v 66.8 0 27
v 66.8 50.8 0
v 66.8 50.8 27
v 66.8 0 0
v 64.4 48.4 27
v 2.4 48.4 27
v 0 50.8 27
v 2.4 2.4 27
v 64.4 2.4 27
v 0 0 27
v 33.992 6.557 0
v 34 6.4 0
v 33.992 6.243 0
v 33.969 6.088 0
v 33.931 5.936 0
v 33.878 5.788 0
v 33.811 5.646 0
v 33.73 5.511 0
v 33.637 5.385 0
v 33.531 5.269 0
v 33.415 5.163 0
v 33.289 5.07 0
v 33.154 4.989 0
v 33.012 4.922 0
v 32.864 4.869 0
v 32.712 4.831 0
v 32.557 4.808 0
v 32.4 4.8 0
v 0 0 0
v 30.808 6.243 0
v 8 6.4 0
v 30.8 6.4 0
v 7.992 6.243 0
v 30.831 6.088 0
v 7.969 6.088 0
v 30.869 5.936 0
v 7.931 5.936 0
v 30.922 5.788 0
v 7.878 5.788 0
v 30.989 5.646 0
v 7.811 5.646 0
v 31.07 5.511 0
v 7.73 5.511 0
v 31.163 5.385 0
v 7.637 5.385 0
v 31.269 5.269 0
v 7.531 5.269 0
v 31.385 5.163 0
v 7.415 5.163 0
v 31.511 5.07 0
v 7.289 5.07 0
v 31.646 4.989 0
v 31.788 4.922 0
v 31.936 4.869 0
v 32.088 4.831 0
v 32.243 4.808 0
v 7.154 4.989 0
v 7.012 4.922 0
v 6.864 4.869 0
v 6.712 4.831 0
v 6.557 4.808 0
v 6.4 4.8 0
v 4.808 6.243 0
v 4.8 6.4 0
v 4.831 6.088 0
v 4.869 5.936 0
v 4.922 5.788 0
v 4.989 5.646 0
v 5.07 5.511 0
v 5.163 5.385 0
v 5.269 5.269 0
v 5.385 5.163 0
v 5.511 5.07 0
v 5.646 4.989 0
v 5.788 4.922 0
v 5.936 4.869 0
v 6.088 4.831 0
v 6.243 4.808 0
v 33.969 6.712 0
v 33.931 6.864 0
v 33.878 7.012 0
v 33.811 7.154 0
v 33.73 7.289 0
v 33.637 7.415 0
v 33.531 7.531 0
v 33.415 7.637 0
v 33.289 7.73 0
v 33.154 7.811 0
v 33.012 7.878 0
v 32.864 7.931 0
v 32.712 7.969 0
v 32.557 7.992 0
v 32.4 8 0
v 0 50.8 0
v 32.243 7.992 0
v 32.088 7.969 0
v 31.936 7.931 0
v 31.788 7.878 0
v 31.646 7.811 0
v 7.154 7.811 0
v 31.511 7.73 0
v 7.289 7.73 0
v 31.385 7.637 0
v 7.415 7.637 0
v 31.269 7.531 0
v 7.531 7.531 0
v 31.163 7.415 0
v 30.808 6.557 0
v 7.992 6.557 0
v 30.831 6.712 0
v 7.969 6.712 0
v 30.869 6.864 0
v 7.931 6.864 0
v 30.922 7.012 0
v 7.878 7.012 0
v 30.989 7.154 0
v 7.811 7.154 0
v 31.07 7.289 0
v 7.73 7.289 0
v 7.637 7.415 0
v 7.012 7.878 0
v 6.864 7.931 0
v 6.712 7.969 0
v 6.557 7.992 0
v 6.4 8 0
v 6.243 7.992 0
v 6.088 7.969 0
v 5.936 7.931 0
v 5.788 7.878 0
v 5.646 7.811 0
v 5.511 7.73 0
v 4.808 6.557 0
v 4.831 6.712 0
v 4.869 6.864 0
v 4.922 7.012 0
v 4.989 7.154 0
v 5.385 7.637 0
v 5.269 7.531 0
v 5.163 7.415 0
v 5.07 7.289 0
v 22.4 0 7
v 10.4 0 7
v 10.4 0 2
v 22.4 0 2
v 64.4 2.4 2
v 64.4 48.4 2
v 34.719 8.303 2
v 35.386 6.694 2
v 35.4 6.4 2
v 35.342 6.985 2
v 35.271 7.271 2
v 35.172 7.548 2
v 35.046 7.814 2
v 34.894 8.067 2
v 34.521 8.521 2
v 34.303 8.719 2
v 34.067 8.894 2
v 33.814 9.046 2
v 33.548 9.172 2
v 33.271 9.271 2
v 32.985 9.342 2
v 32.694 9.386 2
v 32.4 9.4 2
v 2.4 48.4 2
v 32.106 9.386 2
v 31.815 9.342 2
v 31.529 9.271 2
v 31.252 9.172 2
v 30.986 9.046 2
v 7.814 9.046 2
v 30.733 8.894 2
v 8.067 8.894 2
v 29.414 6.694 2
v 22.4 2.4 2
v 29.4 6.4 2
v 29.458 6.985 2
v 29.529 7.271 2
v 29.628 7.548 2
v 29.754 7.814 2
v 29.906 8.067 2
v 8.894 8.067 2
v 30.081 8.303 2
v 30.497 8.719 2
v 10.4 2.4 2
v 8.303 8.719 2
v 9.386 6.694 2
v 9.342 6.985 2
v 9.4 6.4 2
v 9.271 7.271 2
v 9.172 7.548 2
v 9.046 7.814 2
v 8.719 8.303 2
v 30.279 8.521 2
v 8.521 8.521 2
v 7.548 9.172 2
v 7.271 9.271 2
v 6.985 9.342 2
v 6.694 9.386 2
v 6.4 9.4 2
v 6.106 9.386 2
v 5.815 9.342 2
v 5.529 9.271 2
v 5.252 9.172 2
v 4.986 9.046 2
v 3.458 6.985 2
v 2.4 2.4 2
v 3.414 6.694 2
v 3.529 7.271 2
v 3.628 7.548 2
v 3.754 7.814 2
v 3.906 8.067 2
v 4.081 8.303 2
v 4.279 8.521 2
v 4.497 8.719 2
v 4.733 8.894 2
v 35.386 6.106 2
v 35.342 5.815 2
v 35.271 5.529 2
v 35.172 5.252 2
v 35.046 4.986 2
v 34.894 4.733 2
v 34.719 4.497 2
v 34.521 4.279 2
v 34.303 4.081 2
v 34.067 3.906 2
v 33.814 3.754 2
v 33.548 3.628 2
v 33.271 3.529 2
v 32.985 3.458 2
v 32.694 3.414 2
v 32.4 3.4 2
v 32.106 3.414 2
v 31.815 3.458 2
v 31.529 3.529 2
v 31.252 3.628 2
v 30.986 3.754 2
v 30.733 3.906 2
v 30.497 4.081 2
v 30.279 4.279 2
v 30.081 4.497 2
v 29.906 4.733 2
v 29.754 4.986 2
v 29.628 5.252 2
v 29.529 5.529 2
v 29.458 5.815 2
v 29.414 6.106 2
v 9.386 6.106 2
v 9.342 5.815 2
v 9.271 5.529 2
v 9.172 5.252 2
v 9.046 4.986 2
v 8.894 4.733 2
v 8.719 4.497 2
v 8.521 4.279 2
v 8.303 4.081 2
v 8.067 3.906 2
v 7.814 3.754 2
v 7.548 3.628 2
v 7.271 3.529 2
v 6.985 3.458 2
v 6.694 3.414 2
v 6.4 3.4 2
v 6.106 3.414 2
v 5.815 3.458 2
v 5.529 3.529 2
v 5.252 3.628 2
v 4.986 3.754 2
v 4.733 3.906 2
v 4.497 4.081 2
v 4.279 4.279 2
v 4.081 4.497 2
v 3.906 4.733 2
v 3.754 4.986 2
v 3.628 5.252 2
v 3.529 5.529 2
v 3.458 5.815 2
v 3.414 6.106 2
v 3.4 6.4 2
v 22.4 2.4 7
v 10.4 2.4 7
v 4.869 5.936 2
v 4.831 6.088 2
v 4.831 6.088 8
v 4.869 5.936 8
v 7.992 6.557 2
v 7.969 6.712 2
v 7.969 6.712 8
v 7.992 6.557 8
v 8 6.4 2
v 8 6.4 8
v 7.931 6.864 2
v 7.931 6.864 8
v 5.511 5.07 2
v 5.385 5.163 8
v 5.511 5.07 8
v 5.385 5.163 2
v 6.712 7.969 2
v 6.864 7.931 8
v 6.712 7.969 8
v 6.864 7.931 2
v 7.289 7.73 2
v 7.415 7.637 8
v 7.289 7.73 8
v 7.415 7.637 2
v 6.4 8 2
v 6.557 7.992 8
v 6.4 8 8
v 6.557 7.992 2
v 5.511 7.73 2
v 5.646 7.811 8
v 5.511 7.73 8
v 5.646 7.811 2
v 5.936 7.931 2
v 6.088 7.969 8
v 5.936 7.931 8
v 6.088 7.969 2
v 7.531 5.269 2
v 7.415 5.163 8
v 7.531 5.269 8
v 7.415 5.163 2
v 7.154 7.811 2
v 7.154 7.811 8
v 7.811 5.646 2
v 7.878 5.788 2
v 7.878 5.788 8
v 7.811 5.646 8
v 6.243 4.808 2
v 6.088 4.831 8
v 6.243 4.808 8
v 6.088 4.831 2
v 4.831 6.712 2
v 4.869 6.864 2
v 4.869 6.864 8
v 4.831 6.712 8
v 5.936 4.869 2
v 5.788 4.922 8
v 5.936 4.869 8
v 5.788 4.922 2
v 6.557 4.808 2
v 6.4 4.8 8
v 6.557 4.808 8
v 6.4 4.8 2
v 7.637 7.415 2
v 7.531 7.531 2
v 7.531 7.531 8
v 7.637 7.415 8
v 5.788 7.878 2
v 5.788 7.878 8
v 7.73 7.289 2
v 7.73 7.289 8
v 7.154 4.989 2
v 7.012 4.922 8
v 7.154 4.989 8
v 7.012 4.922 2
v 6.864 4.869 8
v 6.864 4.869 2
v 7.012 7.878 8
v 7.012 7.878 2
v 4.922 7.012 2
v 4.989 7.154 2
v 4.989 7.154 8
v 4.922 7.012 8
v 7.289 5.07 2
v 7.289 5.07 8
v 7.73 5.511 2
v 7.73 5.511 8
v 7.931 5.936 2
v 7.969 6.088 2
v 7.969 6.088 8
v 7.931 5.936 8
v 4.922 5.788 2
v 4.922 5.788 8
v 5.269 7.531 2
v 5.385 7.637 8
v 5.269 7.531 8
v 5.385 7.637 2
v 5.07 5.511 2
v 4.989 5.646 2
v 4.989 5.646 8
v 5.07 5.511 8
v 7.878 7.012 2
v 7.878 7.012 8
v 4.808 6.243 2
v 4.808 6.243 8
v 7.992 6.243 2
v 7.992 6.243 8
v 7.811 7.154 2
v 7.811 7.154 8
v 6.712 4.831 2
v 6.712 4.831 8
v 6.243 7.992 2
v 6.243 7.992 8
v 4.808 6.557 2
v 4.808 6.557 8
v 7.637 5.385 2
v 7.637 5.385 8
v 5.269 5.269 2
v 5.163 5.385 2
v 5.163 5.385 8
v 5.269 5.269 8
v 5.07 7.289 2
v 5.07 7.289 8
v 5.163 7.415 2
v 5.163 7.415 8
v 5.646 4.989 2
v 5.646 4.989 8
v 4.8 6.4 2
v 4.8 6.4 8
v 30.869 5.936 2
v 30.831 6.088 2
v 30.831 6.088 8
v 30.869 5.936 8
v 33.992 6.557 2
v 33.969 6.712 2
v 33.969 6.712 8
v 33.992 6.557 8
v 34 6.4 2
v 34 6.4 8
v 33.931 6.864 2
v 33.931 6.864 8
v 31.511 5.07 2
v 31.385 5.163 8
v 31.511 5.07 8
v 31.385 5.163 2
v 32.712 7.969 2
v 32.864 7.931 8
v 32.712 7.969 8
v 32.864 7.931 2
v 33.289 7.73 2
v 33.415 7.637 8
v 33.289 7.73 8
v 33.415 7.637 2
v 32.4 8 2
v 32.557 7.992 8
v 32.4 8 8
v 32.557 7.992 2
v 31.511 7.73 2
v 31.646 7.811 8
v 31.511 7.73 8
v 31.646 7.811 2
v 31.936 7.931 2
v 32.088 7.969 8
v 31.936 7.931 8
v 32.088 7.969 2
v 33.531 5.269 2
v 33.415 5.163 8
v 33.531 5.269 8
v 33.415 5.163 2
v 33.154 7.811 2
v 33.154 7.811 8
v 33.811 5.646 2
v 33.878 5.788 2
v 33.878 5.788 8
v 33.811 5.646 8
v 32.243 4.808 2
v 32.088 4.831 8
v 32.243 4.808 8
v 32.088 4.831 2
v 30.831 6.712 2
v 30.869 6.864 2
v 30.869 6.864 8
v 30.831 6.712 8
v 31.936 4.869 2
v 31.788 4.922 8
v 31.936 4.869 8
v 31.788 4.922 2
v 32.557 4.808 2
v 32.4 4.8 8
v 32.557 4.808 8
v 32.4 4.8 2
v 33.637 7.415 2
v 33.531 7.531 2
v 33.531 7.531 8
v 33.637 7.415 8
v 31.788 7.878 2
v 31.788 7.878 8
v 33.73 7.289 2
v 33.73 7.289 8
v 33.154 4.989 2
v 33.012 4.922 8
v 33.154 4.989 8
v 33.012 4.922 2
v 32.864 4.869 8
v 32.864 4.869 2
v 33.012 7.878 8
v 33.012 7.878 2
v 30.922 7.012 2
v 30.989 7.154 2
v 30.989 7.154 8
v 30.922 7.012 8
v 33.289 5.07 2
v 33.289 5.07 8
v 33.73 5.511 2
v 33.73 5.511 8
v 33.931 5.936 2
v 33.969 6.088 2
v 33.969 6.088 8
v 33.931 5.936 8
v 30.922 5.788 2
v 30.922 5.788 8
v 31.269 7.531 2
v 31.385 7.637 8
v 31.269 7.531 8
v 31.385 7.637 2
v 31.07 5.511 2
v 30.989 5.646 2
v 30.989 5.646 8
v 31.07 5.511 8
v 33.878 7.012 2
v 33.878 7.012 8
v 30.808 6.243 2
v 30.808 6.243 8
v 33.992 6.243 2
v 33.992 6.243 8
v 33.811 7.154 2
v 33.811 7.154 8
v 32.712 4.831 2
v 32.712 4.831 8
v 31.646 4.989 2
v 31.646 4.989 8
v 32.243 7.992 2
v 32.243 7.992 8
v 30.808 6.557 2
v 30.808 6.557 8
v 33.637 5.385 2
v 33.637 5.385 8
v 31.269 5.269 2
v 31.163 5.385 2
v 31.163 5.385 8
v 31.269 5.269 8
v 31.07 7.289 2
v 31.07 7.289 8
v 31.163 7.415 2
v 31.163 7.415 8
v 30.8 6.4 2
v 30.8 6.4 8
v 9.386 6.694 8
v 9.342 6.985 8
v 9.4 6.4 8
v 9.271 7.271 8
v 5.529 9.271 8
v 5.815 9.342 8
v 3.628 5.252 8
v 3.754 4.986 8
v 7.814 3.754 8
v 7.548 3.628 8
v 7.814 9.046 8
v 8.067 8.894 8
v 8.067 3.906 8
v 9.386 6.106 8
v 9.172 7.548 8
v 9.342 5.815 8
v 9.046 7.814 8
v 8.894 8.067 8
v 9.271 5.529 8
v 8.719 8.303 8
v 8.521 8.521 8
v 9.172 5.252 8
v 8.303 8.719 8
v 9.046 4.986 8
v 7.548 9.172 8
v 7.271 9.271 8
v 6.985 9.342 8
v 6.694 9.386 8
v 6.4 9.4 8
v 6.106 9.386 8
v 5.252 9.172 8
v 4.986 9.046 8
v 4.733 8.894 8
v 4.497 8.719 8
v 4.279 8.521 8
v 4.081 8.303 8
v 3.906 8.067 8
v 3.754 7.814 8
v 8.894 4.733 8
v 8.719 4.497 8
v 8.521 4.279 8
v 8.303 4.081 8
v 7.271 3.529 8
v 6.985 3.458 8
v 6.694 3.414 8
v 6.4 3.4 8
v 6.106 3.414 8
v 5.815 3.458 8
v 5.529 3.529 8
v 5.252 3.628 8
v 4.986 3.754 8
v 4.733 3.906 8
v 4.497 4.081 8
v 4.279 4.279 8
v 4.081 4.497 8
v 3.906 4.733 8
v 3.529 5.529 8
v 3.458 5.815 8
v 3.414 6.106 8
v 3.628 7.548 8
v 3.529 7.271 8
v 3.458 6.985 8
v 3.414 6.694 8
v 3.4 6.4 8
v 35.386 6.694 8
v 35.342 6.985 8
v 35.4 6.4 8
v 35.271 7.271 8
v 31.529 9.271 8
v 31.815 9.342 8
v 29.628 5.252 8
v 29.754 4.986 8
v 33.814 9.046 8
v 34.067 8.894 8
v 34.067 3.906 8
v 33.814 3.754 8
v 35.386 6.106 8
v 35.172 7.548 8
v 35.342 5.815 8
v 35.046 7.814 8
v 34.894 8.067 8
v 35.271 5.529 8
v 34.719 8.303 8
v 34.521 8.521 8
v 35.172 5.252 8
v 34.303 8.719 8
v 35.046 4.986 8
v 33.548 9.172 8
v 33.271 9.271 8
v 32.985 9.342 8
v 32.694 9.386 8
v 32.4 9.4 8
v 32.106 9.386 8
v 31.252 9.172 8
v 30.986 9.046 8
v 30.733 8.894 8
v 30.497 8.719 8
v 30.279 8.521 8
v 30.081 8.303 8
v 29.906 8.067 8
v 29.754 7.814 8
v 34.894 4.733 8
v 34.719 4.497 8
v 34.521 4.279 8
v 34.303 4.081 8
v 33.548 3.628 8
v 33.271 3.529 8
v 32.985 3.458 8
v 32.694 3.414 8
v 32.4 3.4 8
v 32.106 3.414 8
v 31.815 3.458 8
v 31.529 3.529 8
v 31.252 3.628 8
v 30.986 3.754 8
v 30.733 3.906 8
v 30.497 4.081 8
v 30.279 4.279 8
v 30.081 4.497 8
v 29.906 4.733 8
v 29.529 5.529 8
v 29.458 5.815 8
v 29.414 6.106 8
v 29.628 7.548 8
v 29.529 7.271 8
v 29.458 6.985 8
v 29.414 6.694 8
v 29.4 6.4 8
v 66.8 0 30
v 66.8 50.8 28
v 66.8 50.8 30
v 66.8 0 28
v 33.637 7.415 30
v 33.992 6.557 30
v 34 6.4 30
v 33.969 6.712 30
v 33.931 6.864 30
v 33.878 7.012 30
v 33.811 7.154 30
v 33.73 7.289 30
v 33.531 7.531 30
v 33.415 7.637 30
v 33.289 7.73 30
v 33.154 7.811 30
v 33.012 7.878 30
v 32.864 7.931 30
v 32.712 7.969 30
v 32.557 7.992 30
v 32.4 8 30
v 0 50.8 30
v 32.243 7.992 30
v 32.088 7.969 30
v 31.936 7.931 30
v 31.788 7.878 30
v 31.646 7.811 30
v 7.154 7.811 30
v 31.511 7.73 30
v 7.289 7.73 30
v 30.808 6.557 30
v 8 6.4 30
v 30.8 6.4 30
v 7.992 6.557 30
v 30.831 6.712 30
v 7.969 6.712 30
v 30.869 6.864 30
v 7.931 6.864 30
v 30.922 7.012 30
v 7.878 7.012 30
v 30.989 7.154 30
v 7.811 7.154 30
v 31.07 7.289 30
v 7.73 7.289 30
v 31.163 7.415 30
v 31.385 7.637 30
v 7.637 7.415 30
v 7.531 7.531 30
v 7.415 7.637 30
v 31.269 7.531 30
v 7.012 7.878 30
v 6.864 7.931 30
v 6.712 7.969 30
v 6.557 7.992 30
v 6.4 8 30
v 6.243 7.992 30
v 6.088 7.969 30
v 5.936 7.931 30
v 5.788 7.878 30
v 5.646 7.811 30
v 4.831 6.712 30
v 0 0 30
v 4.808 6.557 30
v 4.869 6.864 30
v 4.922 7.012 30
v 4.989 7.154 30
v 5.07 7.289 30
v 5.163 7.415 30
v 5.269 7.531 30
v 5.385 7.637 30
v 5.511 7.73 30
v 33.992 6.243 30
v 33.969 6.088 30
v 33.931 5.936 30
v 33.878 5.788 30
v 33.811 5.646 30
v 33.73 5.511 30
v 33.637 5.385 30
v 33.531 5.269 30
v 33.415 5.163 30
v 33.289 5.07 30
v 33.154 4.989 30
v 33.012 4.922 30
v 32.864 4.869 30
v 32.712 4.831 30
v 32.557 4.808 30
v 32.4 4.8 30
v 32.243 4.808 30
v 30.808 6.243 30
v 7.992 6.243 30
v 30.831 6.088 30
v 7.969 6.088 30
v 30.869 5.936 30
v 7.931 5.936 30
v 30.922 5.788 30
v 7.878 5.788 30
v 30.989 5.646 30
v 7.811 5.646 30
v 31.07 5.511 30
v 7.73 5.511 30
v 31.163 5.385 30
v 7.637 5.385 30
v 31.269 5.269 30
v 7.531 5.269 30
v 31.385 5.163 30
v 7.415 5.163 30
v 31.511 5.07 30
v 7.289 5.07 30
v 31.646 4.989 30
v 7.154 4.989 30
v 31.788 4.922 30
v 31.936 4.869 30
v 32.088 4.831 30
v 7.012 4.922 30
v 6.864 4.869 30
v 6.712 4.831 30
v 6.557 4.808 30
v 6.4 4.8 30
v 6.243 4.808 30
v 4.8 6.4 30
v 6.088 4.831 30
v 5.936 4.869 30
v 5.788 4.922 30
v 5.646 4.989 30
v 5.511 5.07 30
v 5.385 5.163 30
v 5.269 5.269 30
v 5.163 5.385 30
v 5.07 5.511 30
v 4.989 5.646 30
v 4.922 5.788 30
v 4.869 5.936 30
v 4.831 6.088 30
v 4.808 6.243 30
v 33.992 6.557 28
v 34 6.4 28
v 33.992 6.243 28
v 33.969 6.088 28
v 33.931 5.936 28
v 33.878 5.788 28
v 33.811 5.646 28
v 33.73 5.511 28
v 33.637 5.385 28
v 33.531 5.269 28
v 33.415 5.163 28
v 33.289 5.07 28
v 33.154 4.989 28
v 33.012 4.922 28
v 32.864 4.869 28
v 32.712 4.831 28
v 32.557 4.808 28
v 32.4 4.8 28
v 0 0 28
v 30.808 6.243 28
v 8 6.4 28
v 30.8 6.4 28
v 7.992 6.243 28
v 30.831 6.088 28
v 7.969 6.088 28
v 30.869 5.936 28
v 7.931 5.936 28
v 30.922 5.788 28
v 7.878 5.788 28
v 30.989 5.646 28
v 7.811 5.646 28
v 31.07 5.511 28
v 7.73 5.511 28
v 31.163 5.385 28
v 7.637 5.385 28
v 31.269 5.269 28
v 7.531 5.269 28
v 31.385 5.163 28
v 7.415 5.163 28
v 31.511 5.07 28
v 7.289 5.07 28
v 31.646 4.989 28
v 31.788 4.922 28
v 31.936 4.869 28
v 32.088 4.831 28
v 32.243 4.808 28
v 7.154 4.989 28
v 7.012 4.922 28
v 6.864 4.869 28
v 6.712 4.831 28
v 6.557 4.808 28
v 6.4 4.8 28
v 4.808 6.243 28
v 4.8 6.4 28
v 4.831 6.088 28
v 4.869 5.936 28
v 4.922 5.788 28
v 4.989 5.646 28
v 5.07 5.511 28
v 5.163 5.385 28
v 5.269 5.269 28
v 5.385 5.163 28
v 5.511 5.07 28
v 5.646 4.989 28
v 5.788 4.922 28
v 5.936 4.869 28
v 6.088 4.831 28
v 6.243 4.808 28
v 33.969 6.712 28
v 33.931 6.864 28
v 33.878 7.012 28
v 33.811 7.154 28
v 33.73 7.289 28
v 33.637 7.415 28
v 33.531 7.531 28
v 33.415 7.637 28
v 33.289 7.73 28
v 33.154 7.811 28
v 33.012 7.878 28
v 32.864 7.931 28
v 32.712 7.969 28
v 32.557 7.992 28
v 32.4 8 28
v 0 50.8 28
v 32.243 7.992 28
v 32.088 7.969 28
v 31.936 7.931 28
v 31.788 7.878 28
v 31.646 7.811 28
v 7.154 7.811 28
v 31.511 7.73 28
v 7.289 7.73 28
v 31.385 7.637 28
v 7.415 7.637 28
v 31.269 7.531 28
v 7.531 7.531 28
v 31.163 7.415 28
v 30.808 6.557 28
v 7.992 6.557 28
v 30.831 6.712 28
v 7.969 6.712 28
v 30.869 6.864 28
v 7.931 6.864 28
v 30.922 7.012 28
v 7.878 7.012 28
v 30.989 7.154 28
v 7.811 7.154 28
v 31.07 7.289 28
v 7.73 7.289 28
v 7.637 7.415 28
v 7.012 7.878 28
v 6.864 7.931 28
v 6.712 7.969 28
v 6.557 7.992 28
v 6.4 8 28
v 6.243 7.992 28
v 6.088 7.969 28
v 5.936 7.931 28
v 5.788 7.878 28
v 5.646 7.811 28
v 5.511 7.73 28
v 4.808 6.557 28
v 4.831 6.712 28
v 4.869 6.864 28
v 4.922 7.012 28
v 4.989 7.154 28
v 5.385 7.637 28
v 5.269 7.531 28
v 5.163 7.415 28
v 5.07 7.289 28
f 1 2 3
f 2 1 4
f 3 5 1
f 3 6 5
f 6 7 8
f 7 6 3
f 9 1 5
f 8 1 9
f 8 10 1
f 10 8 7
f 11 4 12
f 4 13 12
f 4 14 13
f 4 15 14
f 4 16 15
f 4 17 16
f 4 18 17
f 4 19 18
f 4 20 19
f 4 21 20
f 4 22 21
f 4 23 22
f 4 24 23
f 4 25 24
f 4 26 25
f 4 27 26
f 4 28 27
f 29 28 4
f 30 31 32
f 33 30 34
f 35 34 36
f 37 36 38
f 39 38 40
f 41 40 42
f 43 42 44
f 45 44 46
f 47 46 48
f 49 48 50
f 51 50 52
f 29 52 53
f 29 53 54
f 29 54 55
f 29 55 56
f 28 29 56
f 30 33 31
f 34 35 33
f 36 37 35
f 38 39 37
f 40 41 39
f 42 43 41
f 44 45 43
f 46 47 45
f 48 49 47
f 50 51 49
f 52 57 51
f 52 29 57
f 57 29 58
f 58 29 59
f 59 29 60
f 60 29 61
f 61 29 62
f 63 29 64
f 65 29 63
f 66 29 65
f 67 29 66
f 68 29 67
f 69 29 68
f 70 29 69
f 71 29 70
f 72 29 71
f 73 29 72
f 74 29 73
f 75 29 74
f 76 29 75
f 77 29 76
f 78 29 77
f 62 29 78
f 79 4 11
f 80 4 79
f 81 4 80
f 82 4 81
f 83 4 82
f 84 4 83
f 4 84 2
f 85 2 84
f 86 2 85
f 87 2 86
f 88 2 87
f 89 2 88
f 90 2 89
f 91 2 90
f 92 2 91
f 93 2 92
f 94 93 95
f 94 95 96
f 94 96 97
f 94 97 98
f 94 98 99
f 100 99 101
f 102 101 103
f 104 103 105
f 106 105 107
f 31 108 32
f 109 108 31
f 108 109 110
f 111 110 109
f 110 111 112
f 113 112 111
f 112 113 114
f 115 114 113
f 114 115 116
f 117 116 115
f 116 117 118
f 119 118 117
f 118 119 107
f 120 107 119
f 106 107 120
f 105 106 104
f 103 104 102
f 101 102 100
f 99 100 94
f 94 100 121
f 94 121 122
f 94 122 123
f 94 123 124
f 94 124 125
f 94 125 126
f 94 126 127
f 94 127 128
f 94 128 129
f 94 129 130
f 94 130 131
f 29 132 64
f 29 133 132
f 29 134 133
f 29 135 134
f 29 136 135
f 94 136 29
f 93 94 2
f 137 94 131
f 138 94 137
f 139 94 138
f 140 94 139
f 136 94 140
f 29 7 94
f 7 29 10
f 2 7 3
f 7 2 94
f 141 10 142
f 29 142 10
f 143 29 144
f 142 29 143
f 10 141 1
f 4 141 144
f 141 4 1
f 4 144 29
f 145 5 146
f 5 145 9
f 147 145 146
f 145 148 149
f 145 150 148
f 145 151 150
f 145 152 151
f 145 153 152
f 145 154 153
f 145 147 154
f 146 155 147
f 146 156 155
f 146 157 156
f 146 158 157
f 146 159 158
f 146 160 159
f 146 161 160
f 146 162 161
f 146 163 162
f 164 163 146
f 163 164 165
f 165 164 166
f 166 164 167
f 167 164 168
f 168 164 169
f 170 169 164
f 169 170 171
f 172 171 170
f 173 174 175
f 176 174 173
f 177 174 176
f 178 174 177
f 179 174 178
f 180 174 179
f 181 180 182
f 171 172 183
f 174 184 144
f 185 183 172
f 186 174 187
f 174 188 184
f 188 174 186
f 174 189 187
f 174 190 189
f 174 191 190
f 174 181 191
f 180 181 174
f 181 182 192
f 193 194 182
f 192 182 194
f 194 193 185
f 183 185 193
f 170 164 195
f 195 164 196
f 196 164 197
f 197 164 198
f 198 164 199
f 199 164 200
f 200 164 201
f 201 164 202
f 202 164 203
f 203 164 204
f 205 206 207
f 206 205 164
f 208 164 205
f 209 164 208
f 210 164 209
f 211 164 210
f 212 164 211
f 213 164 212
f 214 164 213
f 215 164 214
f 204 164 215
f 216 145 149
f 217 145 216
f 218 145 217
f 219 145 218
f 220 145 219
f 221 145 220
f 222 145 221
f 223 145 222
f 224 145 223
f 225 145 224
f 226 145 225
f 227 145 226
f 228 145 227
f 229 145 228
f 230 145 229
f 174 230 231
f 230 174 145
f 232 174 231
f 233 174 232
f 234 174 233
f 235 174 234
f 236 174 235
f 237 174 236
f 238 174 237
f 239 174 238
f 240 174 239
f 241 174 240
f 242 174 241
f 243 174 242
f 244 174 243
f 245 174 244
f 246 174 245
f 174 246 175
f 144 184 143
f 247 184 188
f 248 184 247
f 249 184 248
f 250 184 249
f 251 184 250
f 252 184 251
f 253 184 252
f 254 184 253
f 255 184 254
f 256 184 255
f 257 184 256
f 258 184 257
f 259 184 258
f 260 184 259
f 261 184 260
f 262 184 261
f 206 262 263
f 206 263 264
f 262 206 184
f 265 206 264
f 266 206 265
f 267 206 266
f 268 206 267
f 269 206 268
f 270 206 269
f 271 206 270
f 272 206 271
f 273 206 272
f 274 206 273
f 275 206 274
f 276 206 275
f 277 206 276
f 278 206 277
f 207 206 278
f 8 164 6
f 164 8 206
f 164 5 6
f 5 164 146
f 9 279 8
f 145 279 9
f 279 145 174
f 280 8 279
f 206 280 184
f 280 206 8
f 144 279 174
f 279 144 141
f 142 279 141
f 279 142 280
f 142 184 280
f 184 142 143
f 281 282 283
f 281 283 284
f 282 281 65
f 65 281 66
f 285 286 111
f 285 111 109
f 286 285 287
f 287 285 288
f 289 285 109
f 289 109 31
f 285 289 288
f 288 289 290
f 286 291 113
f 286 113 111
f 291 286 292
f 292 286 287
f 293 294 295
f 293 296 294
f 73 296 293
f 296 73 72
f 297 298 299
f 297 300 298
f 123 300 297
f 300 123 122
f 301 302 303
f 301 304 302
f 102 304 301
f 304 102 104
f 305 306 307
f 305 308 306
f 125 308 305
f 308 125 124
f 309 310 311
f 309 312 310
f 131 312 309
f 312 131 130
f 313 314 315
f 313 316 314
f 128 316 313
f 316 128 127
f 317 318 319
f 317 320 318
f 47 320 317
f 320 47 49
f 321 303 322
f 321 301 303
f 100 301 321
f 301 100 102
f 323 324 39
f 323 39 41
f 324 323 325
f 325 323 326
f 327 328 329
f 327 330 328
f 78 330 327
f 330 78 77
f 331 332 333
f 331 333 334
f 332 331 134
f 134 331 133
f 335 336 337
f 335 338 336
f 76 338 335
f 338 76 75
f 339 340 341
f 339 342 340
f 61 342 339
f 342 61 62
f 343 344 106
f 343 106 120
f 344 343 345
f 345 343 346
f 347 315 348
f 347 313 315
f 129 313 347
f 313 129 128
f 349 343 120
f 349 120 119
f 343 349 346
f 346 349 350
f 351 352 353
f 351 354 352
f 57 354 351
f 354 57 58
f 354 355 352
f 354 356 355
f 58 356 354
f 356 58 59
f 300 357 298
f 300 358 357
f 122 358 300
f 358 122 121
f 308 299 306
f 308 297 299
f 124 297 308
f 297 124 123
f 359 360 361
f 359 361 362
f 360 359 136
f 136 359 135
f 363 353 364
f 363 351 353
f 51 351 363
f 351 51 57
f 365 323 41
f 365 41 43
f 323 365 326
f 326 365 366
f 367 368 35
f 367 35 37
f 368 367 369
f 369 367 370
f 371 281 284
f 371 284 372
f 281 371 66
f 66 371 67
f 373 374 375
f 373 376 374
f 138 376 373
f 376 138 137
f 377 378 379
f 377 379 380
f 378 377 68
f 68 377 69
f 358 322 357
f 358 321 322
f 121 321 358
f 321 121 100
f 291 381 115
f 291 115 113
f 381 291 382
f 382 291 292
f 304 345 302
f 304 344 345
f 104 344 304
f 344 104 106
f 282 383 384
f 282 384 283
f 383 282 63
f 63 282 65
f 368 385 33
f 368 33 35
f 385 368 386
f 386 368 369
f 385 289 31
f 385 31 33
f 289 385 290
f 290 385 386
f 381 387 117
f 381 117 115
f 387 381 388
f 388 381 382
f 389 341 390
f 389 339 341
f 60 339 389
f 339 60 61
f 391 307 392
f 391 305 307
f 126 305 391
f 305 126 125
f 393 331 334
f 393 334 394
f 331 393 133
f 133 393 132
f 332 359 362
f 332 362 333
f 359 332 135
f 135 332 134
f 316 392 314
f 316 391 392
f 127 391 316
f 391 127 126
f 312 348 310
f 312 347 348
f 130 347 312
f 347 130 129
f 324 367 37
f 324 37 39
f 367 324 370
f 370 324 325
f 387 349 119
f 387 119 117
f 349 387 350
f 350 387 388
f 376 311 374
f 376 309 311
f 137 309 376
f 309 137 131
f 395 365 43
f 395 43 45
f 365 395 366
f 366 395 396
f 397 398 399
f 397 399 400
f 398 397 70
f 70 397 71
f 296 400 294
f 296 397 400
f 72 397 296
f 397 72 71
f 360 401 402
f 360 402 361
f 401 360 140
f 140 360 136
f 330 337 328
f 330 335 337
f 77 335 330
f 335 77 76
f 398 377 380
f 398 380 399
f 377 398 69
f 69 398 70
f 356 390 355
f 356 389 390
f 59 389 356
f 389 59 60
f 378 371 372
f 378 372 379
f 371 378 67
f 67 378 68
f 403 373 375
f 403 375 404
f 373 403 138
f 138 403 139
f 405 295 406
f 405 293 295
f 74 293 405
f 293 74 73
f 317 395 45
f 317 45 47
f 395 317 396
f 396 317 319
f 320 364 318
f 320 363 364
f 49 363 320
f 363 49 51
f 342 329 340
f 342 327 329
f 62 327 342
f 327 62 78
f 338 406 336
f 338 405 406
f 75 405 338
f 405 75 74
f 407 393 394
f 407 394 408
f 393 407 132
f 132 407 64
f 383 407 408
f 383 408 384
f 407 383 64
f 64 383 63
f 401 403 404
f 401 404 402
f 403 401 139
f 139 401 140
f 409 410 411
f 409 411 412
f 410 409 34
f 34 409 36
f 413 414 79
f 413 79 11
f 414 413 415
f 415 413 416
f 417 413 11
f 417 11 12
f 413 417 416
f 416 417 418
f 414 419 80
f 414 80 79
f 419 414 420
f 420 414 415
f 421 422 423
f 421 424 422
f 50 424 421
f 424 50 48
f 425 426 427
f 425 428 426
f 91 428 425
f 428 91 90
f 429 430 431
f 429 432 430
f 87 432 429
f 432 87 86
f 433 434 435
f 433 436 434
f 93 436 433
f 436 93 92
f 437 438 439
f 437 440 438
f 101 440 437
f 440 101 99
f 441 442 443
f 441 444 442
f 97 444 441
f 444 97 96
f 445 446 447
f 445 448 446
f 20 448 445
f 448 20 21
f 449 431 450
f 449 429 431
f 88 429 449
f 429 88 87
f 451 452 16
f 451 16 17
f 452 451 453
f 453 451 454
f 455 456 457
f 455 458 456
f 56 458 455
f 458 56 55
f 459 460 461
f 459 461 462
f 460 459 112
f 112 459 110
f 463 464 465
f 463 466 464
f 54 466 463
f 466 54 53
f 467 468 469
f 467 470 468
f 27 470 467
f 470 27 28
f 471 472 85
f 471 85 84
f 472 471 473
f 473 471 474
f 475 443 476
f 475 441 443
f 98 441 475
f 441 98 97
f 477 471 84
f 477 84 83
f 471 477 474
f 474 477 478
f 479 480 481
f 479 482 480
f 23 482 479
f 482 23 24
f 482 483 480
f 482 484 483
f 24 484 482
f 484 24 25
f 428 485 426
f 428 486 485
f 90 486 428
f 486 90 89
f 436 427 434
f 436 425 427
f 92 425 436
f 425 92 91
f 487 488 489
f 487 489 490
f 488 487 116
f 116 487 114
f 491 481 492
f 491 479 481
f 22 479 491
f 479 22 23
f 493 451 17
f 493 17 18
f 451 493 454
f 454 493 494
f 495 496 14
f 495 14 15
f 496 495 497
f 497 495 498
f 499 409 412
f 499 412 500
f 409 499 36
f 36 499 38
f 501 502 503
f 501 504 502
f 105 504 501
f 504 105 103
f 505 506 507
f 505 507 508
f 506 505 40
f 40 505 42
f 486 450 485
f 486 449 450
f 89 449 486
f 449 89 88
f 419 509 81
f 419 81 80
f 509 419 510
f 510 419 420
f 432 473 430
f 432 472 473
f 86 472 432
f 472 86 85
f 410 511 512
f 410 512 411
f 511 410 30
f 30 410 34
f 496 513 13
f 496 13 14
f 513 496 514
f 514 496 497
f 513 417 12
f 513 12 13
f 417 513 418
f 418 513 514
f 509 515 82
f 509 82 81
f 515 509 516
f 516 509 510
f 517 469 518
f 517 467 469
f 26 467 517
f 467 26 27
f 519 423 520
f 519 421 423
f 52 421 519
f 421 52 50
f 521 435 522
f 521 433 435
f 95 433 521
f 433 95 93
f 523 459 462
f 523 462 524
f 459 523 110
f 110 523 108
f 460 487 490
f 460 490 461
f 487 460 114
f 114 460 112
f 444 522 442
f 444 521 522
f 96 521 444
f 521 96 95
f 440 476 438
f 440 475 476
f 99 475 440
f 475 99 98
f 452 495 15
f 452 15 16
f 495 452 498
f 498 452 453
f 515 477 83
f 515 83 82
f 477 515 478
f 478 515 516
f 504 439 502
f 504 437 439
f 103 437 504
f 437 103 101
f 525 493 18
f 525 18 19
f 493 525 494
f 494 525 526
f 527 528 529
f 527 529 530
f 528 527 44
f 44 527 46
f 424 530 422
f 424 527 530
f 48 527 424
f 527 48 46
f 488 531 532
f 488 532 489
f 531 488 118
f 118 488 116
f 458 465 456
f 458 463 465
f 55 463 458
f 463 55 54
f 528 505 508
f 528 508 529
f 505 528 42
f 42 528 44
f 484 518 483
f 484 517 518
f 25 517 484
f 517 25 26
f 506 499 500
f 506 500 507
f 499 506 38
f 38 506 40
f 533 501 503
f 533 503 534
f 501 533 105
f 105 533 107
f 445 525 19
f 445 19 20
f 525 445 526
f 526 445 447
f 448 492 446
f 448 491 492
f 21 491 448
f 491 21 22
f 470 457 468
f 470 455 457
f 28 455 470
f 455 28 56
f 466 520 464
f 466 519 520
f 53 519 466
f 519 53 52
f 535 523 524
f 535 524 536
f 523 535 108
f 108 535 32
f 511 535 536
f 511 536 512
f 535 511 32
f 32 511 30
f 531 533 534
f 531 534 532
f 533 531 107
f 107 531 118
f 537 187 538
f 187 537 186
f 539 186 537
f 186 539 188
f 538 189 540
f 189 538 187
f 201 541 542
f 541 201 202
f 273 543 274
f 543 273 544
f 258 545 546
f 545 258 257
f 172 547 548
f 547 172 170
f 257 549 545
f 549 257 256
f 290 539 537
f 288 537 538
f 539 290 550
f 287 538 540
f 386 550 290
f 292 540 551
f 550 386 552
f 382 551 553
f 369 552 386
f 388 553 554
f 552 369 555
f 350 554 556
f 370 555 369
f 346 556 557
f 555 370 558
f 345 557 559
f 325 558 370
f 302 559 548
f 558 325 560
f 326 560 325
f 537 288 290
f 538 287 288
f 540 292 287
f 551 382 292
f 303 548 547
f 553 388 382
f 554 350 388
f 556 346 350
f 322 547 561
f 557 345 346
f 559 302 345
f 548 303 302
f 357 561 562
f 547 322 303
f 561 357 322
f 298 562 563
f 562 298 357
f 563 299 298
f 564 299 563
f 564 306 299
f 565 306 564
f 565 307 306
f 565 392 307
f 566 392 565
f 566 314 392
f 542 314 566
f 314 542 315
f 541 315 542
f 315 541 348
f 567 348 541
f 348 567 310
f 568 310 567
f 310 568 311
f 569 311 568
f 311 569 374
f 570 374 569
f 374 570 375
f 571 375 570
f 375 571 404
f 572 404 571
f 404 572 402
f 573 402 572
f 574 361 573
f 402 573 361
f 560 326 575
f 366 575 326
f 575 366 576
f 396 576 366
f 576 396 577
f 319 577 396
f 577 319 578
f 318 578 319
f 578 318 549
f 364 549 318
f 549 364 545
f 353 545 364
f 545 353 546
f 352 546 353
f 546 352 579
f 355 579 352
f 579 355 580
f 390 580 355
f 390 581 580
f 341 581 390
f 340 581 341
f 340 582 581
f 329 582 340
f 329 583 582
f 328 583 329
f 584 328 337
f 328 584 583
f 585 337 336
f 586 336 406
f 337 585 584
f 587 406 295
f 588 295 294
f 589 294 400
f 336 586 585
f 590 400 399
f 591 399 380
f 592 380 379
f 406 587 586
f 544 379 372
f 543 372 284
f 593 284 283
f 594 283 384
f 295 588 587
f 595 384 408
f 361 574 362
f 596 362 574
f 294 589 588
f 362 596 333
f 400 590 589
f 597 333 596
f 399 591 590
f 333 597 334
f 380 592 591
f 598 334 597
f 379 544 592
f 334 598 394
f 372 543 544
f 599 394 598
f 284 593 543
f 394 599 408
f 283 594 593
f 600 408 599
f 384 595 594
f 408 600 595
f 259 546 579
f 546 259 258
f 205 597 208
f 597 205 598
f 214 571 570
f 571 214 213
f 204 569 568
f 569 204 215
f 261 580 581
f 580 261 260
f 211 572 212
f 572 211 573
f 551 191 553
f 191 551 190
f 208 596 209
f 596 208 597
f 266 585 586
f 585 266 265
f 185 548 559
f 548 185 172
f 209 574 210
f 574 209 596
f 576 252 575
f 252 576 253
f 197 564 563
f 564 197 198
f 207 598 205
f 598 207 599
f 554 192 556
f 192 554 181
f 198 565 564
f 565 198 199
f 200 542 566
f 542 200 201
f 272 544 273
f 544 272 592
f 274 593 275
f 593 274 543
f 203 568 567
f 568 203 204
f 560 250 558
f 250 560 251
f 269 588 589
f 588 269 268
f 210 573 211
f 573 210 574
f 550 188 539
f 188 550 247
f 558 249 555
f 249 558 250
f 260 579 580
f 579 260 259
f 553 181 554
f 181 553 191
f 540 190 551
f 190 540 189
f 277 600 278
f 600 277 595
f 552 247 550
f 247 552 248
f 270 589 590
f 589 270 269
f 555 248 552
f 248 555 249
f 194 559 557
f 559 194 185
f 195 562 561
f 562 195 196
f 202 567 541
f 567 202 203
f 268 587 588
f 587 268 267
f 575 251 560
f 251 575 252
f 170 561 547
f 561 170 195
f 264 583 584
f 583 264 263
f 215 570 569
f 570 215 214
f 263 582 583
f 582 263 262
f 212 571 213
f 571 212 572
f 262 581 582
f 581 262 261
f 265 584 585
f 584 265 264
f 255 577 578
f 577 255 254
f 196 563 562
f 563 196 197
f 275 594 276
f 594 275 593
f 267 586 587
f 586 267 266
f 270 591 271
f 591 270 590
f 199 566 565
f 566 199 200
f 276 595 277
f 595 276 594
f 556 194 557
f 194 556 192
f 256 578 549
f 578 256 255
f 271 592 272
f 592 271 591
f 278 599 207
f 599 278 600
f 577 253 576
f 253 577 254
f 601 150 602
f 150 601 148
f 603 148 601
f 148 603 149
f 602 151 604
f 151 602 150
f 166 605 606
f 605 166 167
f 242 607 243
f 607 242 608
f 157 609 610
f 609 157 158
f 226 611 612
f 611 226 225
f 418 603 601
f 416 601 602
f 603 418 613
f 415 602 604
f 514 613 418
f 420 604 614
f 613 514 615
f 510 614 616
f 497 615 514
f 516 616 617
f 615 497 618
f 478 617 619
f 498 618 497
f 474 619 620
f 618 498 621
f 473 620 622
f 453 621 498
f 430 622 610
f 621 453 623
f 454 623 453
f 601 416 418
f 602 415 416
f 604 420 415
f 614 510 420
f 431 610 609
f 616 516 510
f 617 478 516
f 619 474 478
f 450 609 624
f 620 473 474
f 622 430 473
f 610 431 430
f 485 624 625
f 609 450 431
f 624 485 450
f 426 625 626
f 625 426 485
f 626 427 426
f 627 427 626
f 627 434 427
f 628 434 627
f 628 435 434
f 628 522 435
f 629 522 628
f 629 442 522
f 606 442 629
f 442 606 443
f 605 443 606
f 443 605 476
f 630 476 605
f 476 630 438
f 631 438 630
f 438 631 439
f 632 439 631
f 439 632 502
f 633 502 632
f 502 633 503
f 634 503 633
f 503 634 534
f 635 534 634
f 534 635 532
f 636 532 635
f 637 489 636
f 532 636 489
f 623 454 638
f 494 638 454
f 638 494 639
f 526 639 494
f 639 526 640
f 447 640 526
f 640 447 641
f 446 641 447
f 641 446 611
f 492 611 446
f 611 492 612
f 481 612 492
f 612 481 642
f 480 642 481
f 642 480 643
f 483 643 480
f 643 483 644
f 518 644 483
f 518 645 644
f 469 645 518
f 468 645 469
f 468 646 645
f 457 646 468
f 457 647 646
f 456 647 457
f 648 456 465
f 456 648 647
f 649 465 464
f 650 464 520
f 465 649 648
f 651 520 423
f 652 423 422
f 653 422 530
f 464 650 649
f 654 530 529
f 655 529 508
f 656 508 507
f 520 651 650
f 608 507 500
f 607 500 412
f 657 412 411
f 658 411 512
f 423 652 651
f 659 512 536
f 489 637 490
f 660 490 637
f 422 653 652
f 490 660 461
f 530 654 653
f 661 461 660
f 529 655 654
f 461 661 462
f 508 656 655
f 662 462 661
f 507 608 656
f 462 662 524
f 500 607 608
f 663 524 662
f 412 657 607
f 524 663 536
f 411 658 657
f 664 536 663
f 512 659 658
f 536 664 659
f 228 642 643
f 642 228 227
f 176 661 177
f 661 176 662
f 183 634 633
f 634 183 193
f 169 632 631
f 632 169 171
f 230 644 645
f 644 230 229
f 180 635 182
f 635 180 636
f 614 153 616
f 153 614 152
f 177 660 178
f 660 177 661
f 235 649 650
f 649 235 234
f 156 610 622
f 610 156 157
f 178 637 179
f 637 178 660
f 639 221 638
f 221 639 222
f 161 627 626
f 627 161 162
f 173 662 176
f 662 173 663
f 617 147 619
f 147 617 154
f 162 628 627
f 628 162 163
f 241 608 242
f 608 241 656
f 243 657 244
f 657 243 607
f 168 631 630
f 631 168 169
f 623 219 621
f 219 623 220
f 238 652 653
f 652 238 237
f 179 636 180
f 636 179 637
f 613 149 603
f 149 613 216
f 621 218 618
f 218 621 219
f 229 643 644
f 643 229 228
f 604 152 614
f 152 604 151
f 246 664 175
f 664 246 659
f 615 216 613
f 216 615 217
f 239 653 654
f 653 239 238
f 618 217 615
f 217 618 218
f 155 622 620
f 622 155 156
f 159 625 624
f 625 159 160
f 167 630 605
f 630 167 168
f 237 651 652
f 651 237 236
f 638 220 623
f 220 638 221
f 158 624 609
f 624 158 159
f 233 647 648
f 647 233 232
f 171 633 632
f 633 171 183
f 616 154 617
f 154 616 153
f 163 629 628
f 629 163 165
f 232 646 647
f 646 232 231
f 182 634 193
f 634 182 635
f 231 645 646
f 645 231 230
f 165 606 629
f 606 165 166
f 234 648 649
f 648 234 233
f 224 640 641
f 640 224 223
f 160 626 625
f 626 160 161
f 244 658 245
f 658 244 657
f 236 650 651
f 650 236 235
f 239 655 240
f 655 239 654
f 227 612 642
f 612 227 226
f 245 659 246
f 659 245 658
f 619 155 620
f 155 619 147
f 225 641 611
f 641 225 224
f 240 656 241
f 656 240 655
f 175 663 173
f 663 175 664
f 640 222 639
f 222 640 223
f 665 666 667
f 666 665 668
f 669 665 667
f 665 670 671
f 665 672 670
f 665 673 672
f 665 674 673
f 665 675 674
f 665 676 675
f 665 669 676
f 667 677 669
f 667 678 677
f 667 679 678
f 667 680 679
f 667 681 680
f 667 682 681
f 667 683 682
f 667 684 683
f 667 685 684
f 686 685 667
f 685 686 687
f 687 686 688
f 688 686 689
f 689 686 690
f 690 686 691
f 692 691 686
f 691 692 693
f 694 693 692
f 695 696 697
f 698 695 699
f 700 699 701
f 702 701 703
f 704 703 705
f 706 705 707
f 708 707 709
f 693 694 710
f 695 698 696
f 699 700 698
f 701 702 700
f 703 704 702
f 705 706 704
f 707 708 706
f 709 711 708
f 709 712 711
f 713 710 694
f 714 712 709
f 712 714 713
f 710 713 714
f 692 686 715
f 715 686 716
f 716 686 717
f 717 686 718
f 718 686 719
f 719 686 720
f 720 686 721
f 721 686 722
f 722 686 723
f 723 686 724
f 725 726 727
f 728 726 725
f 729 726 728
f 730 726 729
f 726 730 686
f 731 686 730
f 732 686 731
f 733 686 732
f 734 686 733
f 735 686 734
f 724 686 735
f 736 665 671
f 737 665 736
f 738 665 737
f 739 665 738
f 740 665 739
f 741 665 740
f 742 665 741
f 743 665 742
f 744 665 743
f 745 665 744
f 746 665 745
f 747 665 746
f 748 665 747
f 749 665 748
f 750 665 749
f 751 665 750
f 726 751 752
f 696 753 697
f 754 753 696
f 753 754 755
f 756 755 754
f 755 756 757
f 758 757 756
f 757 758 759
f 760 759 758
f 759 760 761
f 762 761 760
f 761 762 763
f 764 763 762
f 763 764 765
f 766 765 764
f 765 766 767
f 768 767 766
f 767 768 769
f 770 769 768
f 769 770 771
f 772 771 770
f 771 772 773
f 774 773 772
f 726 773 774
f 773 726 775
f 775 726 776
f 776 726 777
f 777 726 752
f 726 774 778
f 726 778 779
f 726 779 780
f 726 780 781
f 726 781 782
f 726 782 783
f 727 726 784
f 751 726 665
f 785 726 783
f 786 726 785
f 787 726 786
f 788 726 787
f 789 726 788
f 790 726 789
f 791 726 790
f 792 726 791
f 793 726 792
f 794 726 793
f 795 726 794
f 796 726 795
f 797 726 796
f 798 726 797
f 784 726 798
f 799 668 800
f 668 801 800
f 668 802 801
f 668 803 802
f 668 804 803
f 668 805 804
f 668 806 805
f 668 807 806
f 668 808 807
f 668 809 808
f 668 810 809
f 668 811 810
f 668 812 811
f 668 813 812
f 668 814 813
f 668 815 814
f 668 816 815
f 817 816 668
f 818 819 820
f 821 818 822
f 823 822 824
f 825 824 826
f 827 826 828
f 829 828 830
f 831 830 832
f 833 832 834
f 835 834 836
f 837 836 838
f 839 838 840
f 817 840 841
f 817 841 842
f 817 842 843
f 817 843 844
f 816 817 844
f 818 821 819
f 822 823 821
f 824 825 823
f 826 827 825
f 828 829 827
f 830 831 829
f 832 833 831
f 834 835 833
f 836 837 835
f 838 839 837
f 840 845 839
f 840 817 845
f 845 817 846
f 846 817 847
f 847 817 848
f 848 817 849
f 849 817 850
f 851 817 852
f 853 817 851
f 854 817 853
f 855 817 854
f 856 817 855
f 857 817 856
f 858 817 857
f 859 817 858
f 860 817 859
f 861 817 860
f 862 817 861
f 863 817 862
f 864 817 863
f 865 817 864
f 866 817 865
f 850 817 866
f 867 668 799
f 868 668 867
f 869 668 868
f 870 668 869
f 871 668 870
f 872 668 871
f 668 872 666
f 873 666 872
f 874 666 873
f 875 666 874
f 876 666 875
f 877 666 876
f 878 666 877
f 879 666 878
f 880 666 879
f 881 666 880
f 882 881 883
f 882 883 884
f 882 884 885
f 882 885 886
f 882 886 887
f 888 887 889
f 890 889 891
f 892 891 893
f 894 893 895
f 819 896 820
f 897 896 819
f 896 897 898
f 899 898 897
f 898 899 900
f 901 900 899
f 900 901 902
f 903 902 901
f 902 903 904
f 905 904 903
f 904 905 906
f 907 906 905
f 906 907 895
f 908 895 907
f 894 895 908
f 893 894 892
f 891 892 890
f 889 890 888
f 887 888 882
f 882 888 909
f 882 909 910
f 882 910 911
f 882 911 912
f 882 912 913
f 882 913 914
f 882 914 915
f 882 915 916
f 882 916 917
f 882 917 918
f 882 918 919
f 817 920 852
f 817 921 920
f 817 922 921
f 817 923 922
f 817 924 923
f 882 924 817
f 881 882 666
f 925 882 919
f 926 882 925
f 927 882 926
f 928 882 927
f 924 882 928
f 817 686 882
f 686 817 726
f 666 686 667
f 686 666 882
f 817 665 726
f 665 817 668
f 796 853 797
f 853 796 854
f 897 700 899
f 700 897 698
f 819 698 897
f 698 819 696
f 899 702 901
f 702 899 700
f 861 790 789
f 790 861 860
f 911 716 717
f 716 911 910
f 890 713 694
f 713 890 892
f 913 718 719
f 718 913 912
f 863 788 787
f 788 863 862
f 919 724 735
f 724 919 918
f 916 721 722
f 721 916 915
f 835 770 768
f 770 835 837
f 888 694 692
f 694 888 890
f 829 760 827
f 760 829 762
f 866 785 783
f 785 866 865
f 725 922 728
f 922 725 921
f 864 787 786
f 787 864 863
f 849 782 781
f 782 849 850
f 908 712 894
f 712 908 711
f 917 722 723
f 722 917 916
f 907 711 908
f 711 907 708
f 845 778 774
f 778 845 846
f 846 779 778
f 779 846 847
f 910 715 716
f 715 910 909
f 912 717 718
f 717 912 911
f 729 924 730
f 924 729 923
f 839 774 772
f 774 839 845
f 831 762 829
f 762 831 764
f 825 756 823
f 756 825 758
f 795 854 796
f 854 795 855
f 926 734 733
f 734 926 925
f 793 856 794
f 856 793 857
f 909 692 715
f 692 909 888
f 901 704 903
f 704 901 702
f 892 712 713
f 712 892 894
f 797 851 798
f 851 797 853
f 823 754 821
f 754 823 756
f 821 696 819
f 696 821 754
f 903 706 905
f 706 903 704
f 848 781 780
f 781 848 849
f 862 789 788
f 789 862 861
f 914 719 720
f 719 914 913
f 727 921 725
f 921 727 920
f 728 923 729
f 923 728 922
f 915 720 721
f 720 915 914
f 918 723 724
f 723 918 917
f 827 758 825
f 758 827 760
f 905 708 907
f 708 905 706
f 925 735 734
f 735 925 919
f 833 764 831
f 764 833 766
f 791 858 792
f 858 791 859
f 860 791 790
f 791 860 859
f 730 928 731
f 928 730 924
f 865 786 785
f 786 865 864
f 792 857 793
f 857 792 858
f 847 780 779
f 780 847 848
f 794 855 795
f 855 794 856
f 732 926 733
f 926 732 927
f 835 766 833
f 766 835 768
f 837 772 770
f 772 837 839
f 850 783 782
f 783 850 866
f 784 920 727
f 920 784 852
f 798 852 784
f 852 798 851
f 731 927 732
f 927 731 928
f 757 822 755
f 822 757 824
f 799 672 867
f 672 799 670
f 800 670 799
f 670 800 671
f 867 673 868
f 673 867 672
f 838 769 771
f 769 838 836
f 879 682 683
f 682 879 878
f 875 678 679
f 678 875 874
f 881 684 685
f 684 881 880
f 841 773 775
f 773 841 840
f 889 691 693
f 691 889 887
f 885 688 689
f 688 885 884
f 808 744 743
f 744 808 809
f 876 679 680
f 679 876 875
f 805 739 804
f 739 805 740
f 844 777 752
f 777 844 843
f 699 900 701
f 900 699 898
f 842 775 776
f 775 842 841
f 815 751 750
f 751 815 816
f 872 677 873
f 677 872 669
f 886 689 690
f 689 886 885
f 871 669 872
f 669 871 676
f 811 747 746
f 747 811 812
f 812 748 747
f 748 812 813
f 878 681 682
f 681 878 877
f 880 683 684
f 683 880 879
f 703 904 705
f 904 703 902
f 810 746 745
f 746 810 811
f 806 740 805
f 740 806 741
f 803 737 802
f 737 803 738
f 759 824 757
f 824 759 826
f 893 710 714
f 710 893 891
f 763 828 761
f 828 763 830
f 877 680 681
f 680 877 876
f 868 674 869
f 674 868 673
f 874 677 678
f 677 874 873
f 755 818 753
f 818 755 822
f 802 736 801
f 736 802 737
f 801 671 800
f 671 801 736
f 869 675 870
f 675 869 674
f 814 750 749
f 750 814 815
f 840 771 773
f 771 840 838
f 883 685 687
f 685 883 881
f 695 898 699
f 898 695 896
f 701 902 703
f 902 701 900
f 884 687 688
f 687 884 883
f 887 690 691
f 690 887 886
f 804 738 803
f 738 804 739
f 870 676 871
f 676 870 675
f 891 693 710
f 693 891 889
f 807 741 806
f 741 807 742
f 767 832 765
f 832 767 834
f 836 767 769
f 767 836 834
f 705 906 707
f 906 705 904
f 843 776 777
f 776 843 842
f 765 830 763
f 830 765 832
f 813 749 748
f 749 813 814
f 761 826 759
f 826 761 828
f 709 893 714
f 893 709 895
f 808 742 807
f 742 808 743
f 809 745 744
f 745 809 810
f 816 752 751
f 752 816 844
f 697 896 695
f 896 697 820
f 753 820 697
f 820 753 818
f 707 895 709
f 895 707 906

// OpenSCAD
// Auto-generated by Mecha-Splicer
// enclosure=ctrl_box_2_enclosure

$fn = 64;

inner_w = 62.0;
inner_d = 46.0;
inner_h = 25.0;
wall = 2.4;
floor = 2.0;
lid_t = 2.0;
standoff_h = 6.0;
standoff_od = 6.0;
standoff_hole_d = 3.2;

module base() {
  union() {
    difference() {
      cube([66.8, 50.8, 27.0], center=false);
      translate([2.4, 2.4, 2.0]) cube([62.0, 46.0, 25.0], center=false);
    translate([10.4, 0, 2.0]) cube([12.0, 3.4, 5.0], center=false);
      translate([6.4, 6.4, -1]) cylinder(h=29.0, d=3.2, center=false);
      translate([32.4, 6.4, -1]) cylinder(h=29.0, d=3.2, center=false);
    }
    // Standoffs
    difference() {
      union() {
        translate([6.4, 6.4, 2.0]) cylinder(h=standoff_h, d=standoff_od, center=false);
        translate([32.4, 6.4, 2.0]) cylinder(h=standoff_h, d=standoff_od, center=false);
      }
      translate([6.4, 6.4, 1.0]) cylinder(h=standoff_h + 2, d=standoff_hole_d, center=false);
      translate([32.4, 6.4, 1.0]) cylinder(h=standoff_h + 2, d=standoff_hole_d, center=false);
    }
  }
}

module lid() {
  difference() {
    cube([66.8, 50.8, 2.0], center=false);
    translate([6.4, 6.4, -1]) cylinder(h=4.0, d=3.2, center=false);
    translate([32.4, 6.4, -1]) cylinder(h=4.0, d=3.2, center=false);
  }
}

module enclosure() {
  base();
  translate([0, 0, 28.0]) lid();
}
enclosure();
